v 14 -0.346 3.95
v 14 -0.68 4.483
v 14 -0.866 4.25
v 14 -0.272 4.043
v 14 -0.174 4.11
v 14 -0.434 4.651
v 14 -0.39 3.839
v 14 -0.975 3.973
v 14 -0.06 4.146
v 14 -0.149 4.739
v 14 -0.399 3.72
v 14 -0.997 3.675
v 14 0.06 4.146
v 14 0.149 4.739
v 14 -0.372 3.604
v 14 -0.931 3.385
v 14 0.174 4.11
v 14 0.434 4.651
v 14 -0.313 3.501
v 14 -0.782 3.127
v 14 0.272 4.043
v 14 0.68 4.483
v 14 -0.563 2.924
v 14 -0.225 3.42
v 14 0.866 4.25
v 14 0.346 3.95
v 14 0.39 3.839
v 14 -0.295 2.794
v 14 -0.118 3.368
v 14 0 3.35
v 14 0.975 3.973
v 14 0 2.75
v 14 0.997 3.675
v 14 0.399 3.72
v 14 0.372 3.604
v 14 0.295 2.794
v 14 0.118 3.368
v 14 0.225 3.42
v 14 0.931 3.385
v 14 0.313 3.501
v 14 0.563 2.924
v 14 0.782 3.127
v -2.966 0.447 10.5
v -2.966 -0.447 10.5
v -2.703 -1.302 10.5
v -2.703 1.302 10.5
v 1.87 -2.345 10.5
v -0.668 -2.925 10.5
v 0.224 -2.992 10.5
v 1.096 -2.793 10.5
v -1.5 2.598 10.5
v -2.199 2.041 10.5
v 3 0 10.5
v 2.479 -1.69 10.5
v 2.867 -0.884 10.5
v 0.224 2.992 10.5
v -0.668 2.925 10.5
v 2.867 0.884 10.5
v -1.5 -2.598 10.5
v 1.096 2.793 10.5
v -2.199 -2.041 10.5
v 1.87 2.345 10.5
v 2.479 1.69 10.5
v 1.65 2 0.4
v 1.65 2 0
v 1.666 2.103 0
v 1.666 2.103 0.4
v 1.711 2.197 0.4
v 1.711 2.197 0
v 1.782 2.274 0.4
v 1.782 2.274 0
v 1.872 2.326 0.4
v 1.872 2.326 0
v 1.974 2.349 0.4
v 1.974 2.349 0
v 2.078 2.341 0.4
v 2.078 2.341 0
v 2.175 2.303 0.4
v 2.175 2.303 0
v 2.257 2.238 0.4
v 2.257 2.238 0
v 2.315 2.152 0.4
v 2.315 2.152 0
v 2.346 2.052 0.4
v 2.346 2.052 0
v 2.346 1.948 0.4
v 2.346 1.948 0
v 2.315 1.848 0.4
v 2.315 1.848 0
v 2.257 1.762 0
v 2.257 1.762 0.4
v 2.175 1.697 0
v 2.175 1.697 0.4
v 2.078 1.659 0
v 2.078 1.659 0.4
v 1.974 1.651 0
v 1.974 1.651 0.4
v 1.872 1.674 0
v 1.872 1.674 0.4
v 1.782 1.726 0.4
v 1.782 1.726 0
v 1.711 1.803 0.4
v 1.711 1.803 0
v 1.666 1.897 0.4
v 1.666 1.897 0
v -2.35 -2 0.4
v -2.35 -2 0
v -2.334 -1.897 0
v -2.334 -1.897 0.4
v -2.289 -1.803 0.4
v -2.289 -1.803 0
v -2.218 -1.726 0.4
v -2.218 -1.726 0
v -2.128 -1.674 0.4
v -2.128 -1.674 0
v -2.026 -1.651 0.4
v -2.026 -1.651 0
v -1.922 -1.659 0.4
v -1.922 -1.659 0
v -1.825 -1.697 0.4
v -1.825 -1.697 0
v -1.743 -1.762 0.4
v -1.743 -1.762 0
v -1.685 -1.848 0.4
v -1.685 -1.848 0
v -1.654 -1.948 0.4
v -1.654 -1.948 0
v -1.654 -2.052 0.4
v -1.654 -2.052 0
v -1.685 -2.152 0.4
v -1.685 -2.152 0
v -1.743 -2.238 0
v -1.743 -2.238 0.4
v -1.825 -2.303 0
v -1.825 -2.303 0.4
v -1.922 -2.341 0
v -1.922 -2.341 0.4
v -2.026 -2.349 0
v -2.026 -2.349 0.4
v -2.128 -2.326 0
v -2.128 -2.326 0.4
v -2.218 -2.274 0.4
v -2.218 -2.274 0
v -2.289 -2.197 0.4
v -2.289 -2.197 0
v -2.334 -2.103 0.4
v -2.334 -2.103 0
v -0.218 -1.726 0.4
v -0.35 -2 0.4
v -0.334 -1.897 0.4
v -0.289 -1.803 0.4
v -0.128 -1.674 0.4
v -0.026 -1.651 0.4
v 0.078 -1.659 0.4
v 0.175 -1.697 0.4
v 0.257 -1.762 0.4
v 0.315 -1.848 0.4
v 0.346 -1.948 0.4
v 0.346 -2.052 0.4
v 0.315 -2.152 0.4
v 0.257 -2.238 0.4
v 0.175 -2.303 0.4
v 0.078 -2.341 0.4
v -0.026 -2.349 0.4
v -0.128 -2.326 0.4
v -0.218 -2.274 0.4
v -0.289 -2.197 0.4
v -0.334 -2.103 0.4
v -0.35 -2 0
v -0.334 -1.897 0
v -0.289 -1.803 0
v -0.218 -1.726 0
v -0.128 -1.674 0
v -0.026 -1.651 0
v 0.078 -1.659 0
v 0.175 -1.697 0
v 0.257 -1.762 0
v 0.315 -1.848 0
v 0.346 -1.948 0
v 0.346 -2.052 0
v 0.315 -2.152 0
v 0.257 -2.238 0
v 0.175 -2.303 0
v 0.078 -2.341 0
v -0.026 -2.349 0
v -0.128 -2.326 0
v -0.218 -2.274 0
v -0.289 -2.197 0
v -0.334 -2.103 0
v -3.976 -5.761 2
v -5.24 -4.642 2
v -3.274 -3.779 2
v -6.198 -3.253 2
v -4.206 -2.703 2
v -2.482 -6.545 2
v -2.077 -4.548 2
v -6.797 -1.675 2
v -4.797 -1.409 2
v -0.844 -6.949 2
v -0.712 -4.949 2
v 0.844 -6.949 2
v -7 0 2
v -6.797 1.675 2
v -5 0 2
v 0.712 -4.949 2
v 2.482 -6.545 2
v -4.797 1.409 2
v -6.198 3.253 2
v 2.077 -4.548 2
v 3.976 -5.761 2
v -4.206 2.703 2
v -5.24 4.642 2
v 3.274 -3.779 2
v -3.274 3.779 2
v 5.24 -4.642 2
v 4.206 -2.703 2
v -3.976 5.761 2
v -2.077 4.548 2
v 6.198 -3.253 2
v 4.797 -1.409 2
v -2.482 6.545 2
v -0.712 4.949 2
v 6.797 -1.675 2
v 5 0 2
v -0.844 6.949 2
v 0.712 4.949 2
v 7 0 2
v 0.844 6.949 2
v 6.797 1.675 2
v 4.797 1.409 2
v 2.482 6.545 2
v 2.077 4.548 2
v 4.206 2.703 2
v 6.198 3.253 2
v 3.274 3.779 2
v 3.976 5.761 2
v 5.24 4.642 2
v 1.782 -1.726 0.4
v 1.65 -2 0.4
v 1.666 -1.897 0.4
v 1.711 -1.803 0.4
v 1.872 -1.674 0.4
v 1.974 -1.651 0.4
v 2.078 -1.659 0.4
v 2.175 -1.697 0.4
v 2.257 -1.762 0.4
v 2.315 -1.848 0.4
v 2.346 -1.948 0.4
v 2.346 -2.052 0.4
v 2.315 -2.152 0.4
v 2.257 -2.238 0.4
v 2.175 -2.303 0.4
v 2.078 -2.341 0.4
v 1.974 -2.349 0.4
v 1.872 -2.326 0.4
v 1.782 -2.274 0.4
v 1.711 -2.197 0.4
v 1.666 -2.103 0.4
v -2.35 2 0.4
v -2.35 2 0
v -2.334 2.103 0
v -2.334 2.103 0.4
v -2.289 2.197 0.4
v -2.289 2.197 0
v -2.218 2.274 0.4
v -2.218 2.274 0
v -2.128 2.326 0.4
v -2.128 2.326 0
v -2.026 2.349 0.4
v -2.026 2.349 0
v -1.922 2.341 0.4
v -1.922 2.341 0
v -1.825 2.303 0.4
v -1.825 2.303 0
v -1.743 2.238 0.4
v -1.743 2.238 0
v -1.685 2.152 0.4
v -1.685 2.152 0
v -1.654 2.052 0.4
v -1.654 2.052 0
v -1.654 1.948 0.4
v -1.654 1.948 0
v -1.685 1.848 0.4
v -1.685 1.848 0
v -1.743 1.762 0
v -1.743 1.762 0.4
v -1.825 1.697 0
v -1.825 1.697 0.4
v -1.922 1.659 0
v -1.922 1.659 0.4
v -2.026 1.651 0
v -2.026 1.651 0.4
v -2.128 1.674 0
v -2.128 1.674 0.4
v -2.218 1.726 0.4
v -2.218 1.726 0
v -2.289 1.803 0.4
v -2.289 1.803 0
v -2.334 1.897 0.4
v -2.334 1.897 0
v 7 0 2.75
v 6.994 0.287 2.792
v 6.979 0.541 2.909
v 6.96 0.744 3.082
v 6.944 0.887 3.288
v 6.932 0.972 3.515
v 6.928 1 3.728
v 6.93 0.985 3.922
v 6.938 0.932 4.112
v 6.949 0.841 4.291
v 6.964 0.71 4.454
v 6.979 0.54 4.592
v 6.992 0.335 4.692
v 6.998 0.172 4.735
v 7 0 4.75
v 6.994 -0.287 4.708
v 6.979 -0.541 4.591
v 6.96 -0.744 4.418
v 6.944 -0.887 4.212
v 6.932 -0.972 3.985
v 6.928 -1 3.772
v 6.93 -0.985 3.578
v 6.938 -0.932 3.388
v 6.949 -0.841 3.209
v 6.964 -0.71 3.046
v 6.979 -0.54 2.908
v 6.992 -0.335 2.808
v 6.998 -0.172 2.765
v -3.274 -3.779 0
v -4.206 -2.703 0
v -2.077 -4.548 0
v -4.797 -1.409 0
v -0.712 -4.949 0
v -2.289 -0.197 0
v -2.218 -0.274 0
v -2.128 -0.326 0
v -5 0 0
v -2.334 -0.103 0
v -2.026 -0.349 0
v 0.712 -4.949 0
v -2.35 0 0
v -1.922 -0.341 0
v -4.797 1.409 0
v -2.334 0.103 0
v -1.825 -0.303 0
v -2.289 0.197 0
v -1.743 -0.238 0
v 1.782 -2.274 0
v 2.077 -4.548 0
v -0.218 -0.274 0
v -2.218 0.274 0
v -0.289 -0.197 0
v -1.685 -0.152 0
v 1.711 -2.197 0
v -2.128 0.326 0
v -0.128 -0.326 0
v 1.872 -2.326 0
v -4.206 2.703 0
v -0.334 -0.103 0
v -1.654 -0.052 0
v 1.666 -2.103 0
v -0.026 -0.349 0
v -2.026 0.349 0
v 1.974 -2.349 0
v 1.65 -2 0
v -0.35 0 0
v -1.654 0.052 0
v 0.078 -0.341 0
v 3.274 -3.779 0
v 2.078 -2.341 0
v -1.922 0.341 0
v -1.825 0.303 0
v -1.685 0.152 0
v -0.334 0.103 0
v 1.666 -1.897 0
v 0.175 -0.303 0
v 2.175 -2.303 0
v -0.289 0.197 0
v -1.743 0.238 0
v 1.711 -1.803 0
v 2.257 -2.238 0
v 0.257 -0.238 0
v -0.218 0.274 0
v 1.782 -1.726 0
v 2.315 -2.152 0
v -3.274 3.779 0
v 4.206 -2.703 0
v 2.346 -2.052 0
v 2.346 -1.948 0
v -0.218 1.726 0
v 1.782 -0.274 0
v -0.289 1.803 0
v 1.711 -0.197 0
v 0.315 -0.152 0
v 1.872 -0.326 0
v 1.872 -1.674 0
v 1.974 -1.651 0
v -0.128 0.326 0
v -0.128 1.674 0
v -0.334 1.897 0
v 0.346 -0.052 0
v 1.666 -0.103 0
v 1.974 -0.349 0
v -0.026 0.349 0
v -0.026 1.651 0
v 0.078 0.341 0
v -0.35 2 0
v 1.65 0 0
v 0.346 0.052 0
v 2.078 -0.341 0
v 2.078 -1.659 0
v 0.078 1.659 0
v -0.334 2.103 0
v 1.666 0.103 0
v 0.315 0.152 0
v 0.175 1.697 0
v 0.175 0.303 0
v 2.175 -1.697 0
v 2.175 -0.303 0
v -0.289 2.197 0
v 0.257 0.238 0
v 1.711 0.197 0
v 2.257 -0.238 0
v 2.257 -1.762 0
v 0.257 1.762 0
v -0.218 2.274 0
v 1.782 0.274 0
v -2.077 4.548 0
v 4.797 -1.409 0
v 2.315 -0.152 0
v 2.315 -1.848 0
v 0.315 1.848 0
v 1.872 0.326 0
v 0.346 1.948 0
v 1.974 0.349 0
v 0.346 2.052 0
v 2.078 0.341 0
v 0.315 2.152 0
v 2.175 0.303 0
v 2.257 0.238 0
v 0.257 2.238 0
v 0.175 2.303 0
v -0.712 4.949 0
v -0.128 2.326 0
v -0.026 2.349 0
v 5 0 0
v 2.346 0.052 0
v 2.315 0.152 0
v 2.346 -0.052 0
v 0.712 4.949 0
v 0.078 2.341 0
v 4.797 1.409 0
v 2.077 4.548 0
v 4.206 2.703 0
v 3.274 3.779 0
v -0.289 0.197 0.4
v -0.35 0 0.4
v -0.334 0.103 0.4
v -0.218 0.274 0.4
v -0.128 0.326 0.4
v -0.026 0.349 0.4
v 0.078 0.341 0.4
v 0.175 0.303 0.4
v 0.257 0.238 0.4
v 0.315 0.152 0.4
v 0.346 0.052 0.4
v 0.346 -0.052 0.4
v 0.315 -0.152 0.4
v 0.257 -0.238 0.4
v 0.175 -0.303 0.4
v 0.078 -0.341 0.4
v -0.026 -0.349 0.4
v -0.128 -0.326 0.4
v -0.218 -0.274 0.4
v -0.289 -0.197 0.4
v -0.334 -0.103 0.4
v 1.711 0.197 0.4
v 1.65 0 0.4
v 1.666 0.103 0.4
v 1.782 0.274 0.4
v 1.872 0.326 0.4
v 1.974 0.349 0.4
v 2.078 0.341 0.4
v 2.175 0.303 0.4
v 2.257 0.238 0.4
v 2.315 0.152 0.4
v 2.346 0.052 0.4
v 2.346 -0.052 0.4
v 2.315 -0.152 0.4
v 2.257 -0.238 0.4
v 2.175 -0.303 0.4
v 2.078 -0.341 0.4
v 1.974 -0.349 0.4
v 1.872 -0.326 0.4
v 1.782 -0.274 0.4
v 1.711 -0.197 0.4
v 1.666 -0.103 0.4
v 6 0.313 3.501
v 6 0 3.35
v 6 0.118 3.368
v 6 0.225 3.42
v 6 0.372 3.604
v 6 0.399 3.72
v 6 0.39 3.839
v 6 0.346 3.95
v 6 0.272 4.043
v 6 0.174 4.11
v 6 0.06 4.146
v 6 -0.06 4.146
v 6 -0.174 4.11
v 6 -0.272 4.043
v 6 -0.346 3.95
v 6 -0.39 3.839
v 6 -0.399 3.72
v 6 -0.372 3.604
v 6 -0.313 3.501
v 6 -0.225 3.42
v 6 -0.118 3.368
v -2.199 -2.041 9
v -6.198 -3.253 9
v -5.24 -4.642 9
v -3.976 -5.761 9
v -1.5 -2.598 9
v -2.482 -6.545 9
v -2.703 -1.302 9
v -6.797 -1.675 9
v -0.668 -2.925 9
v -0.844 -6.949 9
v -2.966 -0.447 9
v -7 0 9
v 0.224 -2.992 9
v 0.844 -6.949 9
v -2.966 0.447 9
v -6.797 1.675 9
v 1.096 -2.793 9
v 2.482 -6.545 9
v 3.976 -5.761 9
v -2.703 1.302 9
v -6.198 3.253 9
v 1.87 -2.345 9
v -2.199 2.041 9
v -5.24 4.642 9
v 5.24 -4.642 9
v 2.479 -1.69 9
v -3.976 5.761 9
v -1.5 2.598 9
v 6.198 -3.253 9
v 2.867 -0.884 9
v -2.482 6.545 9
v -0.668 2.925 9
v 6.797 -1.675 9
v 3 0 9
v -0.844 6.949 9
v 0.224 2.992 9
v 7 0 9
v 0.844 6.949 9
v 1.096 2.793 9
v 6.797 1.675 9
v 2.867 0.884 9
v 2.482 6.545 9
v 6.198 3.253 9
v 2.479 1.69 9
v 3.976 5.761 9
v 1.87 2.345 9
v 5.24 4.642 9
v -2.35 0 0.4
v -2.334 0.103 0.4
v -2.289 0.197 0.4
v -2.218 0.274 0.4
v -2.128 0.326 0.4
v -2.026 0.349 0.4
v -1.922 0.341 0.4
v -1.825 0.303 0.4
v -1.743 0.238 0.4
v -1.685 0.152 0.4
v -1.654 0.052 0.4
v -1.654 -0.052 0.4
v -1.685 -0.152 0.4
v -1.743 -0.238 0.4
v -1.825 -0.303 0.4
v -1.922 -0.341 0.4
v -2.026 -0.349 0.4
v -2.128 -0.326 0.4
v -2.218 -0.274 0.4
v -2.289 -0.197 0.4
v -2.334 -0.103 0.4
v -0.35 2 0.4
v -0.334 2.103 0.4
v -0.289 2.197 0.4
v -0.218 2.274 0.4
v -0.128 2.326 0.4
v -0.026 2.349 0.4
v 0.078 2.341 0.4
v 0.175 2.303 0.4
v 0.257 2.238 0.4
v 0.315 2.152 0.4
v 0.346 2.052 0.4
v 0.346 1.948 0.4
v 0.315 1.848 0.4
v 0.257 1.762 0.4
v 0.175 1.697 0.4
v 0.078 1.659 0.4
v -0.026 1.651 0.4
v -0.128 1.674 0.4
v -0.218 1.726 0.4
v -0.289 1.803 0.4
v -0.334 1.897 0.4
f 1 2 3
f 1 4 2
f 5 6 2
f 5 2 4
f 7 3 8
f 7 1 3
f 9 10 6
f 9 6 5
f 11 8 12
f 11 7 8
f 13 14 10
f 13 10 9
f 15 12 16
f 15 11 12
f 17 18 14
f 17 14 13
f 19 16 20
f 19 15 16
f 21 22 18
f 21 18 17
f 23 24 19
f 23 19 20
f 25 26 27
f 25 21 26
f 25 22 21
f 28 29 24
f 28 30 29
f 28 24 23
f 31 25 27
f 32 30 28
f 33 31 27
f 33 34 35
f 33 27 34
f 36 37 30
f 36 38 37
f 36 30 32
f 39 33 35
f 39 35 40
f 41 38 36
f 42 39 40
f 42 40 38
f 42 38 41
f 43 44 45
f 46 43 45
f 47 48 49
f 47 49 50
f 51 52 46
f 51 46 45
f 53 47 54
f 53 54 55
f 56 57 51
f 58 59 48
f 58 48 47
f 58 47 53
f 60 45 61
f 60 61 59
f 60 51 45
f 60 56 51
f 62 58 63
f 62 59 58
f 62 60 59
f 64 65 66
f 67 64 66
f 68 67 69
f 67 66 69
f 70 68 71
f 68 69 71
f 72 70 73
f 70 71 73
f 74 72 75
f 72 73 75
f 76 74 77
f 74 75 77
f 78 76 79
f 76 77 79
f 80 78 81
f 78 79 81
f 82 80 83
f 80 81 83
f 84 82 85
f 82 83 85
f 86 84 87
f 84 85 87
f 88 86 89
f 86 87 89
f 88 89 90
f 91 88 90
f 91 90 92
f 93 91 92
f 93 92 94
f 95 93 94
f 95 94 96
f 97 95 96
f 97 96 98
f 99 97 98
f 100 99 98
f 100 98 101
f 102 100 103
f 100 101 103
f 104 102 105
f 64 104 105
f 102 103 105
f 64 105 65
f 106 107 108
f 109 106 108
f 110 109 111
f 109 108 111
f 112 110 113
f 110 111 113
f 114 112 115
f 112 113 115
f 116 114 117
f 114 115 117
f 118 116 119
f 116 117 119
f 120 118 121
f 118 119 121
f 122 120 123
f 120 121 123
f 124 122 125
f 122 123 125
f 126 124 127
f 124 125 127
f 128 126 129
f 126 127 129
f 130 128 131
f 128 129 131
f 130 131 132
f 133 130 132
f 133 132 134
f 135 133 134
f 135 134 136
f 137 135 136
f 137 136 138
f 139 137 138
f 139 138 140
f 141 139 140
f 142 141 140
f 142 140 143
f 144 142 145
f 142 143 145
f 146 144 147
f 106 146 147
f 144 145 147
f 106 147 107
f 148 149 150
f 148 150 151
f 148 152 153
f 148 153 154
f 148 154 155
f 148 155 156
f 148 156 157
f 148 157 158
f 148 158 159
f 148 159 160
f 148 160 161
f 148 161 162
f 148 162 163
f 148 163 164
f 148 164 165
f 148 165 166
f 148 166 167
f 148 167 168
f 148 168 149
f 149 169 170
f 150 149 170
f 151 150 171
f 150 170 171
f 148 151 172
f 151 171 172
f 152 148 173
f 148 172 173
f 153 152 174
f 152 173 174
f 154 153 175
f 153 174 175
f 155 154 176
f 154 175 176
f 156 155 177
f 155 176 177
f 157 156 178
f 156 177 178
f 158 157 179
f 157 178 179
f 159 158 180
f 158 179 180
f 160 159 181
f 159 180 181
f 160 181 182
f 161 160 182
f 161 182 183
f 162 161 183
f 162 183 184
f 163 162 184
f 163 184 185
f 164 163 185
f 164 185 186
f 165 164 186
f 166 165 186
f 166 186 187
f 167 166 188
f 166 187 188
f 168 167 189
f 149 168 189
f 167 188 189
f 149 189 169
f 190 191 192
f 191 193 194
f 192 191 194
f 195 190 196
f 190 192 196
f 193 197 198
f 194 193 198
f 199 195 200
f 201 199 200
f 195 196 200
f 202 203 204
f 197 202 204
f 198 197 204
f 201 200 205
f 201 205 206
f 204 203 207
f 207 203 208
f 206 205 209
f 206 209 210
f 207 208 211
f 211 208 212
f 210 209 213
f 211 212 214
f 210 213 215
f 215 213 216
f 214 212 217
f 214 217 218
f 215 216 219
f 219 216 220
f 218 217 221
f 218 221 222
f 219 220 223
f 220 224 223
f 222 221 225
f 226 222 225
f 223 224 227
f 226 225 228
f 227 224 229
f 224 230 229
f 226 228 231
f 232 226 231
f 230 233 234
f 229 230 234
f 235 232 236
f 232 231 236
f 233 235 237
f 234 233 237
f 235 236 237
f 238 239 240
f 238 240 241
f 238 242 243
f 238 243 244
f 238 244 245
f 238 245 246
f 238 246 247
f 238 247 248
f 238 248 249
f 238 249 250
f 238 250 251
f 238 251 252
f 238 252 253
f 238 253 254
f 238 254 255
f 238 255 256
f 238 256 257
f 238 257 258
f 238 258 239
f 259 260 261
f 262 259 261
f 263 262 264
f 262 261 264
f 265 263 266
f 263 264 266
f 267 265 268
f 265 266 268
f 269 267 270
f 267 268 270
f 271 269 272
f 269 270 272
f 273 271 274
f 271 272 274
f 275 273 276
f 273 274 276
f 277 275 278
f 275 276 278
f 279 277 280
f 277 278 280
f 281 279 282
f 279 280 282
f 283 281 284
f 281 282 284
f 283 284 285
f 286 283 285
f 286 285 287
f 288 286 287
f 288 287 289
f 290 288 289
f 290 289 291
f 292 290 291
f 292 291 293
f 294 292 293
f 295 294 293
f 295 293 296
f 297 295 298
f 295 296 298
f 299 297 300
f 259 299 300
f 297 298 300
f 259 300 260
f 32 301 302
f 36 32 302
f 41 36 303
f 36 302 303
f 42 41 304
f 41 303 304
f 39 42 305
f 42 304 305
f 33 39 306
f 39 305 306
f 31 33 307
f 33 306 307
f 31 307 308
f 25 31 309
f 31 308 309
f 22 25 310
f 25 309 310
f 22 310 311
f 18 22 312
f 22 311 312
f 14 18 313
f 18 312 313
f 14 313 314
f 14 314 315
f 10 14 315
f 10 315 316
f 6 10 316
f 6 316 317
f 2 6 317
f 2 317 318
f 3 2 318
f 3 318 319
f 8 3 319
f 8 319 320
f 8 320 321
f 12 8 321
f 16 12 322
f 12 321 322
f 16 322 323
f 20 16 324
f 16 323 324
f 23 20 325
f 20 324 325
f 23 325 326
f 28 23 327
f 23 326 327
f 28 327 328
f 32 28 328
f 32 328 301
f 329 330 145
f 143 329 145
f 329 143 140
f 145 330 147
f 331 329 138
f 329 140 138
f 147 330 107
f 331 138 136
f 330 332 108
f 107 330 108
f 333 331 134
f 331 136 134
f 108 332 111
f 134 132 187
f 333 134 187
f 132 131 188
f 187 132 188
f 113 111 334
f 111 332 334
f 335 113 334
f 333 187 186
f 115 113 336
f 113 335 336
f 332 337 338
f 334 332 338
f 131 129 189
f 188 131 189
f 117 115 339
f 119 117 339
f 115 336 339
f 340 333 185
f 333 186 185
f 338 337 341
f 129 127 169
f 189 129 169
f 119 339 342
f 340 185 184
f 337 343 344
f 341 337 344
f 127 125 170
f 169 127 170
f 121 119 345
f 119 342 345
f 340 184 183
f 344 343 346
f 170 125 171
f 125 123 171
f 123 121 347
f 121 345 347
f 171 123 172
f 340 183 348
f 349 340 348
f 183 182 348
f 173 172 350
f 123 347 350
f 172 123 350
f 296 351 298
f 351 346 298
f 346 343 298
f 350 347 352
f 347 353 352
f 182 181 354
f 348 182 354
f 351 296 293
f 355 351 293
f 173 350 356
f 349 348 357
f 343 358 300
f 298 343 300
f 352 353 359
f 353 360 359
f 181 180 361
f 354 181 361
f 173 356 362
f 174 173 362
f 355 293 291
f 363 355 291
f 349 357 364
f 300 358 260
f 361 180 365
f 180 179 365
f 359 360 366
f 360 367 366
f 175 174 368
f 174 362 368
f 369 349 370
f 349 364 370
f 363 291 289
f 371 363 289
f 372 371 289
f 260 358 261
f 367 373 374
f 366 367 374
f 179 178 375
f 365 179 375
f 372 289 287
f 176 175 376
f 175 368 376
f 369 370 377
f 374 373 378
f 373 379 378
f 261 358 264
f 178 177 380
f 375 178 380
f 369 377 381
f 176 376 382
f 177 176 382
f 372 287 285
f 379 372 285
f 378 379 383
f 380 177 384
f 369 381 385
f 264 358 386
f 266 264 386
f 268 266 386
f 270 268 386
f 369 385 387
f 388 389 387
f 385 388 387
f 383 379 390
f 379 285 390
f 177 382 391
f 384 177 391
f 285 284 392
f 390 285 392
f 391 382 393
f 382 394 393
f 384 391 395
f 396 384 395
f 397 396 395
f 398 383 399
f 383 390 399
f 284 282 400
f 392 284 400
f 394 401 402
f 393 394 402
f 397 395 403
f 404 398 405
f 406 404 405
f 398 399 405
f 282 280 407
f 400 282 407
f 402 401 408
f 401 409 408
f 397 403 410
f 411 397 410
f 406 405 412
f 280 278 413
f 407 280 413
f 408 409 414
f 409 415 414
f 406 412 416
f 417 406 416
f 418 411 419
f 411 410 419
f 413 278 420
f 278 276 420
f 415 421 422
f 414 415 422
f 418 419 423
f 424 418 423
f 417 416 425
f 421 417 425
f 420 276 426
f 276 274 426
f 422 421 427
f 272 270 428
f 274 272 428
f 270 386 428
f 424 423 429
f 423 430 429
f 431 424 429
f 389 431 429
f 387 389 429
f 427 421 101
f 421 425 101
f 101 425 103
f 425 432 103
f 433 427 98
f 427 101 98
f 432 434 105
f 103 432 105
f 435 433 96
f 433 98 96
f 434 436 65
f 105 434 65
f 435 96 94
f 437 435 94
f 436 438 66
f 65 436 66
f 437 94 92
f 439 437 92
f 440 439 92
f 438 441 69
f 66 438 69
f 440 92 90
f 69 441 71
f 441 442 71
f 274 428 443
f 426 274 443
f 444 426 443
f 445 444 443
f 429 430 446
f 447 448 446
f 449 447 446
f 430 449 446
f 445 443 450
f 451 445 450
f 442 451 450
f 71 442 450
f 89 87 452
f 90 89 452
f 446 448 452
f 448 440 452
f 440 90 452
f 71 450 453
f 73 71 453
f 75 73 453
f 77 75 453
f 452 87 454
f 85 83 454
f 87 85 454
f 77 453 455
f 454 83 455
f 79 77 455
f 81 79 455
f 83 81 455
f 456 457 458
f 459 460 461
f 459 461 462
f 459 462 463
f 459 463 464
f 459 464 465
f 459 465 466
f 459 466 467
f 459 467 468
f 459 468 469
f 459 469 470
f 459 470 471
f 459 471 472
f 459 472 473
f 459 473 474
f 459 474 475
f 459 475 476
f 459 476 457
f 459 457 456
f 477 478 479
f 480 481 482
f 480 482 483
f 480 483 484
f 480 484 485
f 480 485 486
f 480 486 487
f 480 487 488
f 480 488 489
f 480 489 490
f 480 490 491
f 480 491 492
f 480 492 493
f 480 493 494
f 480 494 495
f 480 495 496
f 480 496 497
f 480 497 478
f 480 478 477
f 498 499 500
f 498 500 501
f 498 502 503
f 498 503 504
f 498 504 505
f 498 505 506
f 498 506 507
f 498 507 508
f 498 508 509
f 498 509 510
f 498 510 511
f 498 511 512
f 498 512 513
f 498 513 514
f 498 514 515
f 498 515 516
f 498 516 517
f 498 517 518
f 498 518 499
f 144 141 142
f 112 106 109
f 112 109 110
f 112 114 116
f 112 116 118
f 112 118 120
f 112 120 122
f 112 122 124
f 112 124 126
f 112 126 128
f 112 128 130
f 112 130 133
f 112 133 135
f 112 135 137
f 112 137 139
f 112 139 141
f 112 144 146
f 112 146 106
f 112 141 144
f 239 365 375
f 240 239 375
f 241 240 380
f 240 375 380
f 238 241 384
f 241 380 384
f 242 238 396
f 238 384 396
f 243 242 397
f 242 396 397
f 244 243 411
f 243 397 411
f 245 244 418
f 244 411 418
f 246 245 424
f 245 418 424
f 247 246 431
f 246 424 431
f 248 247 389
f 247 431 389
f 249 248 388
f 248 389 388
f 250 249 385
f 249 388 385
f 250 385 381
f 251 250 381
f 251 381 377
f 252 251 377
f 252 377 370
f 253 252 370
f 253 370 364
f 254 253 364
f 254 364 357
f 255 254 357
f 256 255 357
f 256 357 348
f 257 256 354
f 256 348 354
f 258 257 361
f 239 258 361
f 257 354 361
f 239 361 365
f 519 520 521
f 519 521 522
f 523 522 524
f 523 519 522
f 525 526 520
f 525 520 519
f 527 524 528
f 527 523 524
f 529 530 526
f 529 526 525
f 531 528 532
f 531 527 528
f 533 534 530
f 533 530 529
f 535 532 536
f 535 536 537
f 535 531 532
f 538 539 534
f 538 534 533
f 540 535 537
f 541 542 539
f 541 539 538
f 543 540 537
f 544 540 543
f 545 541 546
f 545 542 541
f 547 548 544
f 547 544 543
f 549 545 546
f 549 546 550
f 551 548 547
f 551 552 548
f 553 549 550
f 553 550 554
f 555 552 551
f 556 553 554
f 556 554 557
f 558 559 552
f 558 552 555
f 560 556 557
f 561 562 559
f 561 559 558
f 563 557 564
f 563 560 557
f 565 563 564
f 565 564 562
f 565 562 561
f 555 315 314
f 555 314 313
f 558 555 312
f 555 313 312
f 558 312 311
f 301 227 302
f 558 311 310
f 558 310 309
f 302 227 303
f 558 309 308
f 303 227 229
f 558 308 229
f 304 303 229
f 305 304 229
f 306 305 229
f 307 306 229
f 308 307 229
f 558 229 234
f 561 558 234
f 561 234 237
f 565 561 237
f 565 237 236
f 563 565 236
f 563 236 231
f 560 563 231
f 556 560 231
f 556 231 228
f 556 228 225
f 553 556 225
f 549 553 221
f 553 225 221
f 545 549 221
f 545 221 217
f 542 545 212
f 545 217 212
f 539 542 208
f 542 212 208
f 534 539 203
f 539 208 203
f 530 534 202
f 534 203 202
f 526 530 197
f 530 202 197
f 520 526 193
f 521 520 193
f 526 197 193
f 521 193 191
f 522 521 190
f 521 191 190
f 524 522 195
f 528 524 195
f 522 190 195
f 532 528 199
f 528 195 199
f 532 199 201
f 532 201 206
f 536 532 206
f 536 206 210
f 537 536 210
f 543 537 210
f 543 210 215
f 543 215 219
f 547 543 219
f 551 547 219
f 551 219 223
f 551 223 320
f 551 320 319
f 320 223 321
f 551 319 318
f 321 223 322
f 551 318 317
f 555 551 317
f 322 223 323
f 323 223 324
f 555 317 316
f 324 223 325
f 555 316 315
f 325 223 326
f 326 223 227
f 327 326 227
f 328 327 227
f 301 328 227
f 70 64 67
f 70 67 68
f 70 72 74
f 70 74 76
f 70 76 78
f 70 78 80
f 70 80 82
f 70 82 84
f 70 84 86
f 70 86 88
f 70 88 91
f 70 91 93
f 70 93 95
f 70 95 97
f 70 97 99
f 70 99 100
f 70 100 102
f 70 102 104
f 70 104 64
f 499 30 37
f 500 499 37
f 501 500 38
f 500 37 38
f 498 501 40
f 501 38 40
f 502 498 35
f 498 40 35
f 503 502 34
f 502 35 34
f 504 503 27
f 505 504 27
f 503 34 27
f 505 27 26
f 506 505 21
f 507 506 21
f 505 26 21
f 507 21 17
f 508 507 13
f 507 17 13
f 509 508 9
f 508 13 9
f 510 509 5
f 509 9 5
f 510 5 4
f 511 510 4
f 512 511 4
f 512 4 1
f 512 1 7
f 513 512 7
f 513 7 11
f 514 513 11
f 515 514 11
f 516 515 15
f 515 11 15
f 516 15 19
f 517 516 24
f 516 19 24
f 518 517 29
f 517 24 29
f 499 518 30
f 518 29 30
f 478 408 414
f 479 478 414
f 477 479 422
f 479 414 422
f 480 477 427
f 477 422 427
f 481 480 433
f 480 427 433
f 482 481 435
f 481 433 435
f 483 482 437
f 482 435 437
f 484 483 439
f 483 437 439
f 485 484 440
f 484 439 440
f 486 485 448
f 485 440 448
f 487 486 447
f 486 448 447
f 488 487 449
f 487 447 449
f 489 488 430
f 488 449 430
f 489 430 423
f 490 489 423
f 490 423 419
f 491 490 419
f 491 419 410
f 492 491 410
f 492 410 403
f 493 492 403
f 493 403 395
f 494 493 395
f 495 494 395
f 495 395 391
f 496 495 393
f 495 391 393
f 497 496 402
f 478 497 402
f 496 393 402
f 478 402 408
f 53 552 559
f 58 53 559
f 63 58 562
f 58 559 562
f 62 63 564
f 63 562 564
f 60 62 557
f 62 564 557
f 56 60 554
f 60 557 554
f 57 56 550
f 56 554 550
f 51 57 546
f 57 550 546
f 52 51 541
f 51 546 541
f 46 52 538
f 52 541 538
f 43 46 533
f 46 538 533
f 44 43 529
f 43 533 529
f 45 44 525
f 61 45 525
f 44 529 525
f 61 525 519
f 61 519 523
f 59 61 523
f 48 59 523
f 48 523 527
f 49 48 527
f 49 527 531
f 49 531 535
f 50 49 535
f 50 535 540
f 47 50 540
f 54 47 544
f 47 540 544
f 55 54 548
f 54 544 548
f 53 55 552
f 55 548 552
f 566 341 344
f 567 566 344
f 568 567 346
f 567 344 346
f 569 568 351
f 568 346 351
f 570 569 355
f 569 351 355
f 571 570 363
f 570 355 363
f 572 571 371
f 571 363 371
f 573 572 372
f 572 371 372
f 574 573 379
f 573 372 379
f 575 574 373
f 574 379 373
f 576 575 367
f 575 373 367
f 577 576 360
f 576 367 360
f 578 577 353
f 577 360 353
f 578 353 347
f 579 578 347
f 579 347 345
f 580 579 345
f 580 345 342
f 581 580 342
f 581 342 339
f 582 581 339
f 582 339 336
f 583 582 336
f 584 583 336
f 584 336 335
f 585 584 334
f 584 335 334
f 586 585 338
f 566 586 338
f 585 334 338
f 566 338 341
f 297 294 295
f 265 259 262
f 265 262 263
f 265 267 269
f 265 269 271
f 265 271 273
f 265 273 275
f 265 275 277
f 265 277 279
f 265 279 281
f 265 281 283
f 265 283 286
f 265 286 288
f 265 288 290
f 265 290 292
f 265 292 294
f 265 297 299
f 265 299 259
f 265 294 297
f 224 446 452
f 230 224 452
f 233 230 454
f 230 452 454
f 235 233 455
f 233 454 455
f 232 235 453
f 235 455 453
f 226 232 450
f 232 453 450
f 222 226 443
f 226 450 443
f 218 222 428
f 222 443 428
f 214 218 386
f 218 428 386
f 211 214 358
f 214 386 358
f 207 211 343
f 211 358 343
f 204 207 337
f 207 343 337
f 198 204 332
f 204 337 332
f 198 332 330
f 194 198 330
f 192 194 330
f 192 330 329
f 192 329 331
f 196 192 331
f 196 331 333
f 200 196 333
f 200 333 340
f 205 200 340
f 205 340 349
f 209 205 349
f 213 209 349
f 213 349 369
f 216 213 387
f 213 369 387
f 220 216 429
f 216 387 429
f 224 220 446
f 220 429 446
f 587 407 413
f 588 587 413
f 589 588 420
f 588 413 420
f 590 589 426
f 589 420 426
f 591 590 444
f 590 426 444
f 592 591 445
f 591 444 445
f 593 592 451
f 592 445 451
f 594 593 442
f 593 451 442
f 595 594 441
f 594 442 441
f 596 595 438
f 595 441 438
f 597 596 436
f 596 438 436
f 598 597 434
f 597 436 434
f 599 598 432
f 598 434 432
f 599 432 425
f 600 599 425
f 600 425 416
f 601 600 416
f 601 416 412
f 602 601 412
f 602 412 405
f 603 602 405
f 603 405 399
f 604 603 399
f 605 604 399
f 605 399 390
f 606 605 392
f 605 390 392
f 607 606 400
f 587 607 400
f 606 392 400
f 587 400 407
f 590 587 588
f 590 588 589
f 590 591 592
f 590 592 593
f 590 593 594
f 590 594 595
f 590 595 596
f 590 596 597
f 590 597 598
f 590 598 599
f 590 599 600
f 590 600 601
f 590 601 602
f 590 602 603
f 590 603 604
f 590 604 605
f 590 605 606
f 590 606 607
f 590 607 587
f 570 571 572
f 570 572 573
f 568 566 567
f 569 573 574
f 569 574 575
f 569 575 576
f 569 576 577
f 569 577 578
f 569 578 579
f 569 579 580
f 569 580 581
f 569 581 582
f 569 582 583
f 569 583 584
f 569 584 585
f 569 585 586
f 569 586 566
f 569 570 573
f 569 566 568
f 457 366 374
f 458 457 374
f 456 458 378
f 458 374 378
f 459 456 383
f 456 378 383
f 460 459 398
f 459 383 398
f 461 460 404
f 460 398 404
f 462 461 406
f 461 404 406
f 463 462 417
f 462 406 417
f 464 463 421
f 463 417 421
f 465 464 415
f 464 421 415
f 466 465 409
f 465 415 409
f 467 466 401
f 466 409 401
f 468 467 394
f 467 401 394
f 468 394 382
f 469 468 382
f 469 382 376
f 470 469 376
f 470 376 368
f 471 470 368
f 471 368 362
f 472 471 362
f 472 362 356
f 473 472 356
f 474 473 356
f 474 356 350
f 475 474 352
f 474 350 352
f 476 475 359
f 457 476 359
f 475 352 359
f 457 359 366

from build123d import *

# Parameters (mm, degrees)
SKETCH1_R           = 5
BOSS_EXTRUDE1_DEPTH = 2
SKETCH2_R           = 7
BOSS_EXTRUDE2_DEPTH = 7
SKETCH3_R           = 3
BOSS_EXTRUDE3_DEPTH = 1.5
SKETCH4_R           = 1
BOSS_EXTRUDE4_DEPTH = 8
SKETCH5_R           = 0.4
CUT_EXTRUDE1_DEPTH  = 8
SKETCH7_R           = 0.35
CUT_EXTRUDE2_DEPTH  = 0.4


with BuildPart() as part:
    # Sketch1 → Boss-Extrude1 (new body)
    with BuildSketch(Plane.XY):
        Circle(SKETCH1_R)
    extrude(amount=BOSS_EXTRUDE1_DEPTH)

    # Sketch2 → Boss-Extrude2 (add)
    with BuildSketch(Plane.XY.offset(2)):
        Circle(SKETCH2_R)
    extrude(amount=BOSS_EXTRUDE2_DEPTH)

    # Sketch3 → Boss-Extrude3 (add)
    with BuildSketch(Plane.XY.offset(9)):
        Circle(SKETCH3_R)
    extrude(amount=BOSS_EXTRUDE3_DEPTH)

    # Sketch4 → Boss-Extrude4 (add)
    with BuildSketch(Plane(origin=(6, 0, 0), x_dir=(0, 0, -1), z_dir=(1, 0, 0))):
        with Locations((-3.75, 0)):
            Circle(SKETCH4_R)
    extrude(amount=BOSS_EXTRUDE4_DEPTH)

    # Sketch5 → Cut-Extrude1 (cut)
    with BuildSketch(Plane(origin=(14, 0, 0), x_dir=(0, 0, -1), z_dir=(1, 0, 0))):
        with Locations((-3.75, 0)):
            Circle(SKETCH5_R)
    extrude(amount=-CUT_EXTRUDE1_DEPTH, mode=Mode.SUBTRACT)

    # Sketch7 → Cut-Extrude2 (cut)
    with BuildSketch(Plane(origin=(0, 0, 0), x_dir=(-1, 0, 0), z_dir=(0, 0, -1))):
        Circle(SKETCH7_R)
        with Locations((0, 2)):
            Circle(SKETCH7_R)
        with Locations((0, -2)):
            Circle(SKETCH7_R)
        with Locations((2, 0)):
            Circle(SKETCH7_R)
        with Locations((2, 2)):
            Circle(SKETCH7_R)
        with Locations((2, -2)):
            Circle(SKETCH7_R)
        with Locations((-2, 0)):
            Circle(SKETCH7_R)
        with Locations((-2, 2)):
            Circle(SKETCH7_R)
        with Locations((-2, -2)):
            Circle(SKETCH7_R)
    extrude(amount=-CUT_EXTRUDE2_DEPTH, mode=Mode.SUBTRACT)


solid = part.part
